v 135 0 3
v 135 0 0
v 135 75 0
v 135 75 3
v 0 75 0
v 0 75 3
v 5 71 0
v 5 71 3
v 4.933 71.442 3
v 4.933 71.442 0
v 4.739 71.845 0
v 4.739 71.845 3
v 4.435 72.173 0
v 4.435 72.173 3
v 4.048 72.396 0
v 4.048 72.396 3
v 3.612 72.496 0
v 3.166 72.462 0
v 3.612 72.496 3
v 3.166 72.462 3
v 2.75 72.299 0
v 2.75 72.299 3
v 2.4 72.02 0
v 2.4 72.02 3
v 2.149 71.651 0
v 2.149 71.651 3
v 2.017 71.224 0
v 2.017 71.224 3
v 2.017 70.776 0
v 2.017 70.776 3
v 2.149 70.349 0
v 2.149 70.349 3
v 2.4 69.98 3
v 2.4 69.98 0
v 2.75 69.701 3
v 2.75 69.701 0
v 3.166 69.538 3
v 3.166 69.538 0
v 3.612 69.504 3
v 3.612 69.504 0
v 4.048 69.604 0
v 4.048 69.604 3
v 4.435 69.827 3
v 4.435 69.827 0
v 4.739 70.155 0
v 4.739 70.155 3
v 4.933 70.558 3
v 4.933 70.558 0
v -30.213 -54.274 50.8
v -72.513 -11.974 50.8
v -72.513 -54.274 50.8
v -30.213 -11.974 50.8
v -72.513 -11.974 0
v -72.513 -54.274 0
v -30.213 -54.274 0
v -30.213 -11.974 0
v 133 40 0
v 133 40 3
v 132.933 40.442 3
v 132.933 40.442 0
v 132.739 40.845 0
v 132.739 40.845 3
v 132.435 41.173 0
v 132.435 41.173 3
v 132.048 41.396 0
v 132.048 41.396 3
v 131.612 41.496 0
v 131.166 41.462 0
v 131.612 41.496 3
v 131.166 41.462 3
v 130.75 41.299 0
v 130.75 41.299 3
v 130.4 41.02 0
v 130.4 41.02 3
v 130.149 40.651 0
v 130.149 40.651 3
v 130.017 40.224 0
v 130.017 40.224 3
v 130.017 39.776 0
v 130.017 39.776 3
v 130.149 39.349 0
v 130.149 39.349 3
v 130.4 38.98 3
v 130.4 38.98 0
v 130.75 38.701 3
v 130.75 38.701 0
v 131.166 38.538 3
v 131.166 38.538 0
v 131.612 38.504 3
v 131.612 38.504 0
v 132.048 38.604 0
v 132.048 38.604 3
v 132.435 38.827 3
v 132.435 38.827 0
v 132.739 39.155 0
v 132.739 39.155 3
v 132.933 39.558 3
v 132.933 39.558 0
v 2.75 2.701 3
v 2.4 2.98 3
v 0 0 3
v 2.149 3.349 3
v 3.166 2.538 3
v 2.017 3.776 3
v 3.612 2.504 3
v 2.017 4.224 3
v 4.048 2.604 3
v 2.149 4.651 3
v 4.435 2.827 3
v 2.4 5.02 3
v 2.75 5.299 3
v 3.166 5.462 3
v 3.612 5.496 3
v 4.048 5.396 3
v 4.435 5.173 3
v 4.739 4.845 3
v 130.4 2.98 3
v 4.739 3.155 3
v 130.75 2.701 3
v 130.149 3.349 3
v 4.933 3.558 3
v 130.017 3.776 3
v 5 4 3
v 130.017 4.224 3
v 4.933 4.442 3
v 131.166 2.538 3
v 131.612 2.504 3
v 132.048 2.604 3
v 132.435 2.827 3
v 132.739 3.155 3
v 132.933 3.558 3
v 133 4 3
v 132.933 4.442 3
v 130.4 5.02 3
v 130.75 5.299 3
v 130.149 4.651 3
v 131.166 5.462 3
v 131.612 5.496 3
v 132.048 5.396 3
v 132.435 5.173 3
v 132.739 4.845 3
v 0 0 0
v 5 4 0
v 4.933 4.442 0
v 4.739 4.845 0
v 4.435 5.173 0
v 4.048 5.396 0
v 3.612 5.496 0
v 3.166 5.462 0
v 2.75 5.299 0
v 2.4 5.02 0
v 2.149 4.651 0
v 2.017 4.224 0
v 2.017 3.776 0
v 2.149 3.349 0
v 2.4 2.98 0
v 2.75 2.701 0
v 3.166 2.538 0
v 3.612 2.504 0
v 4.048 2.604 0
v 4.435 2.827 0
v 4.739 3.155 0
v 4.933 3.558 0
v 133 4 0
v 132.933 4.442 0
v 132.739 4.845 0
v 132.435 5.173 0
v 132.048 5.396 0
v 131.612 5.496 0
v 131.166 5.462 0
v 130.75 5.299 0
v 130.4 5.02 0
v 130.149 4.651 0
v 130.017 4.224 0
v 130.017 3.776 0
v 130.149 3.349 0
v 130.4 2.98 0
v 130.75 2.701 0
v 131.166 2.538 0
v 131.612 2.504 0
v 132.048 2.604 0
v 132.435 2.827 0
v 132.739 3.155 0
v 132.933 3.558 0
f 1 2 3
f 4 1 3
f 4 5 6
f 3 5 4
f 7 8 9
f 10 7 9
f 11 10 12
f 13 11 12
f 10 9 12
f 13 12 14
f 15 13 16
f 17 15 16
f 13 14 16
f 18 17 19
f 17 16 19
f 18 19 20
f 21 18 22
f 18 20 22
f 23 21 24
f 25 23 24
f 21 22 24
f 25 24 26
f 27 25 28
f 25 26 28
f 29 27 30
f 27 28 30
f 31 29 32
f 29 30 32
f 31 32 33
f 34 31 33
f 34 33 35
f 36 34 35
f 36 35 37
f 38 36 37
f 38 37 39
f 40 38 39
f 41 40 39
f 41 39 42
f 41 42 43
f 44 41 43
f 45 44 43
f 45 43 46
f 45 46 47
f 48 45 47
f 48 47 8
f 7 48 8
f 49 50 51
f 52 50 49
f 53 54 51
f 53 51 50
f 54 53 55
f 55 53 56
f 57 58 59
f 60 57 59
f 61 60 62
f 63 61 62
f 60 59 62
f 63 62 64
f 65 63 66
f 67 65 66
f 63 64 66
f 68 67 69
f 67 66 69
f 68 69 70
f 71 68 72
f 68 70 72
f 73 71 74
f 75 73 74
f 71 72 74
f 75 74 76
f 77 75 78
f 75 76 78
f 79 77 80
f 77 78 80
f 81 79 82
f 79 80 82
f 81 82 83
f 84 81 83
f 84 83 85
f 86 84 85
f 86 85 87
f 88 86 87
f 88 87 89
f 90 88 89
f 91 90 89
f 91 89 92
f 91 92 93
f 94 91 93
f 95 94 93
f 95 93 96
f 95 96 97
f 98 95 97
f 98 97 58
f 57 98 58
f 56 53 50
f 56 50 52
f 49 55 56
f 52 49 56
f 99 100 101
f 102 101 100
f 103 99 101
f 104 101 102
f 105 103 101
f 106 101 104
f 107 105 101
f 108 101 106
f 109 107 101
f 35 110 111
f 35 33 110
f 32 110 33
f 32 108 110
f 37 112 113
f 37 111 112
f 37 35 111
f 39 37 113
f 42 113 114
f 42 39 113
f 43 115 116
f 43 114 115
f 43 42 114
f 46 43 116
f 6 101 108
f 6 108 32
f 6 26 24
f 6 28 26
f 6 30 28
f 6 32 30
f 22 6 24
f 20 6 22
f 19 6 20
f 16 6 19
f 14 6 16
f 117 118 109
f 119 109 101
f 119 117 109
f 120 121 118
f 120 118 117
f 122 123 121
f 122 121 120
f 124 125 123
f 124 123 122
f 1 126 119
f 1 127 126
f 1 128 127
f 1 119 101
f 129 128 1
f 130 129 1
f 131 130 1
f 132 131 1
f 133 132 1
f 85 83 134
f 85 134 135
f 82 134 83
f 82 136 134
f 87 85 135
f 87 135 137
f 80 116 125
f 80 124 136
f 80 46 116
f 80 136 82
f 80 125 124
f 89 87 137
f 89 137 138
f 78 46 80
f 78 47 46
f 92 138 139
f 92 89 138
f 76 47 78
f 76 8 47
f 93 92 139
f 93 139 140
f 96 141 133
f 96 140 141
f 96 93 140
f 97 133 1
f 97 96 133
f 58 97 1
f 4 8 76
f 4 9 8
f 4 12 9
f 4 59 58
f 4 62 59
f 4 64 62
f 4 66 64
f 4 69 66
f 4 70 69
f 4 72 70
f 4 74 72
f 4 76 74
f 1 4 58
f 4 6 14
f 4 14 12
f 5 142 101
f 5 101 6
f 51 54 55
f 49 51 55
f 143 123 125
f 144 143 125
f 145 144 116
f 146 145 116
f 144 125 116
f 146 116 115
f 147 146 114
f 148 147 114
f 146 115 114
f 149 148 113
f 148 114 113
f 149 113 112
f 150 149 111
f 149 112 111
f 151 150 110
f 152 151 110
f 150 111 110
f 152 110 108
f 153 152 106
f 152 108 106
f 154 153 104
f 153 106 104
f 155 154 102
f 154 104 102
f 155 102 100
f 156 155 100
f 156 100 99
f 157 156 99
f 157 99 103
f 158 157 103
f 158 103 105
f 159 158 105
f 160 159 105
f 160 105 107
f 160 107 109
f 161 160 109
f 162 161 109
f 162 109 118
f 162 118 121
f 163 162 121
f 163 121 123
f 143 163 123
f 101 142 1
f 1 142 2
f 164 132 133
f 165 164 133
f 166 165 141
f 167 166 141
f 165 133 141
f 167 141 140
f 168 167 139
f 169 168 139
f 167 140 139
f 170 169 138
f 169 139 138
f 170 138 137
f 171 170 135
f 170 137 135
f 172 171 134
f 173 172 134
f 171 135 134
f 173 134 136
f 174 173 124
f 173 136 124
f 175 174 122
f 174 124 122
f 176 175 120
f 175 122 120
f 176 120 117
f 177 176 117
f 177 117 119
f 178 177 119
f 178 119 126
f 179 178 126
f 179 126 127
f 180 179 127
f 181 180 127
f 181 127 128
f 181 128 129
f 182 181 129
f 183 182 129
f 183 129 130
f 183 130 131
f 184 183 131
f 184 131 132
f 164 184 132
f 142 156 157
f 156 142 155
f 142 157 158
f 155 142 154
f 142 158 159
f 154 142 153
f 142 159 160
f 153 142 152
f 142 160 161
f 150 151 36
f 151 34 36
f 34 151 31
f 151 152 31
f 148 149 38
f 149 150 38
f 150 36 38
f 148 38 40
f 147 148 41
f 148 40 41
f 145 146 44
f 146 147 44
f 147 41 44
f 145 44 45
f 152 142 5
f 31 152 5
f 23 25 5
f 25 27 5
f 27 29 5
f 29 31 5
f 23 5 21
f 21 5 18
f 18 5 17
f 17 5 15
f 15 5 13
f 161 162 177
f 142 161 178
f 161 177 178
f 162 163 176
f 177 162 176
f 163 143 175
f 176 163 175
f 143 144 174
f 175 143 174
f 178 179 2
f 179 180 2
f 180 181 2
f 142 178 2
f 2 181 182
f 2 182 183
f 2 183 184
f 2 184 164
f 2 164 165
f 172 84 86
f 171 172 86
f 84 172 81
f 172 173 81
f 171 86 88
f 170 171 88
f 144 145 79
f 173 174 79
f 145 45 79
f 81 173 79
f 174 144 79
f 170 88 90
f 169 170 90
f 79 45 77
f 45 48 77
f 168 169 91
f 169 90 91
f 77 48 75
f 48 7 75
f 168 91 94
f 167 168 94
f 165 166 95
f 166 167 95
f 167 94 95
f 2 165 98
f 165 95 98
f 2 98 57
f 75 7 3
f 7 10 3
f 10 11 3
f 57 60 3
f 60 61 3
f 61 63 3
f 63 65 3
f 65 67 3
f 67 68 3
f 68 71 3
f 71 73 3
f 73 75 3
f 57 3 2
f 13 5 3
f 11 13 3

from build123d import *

# Parameters (mm, degrees)
F0_W     = 135
F0_H     = 75
F1_DEPTH = 3
F2_R     = 1.5
F3_DEPTH = 25
F4_W     = 42.3
F4_H     = 42.3
F5_DEPTH = 50.8


with BuildPart() as f1:
    # F0 (on Top) → F1 (new body)
    with BuildSketch(Plane.XY):
        with Locations((67.5, 37.5)):
            Rectangle(F0_W, F0_H)
    extrude(amount=F1_DEPTH)

    # F2 (on face) → F3 (cut)
    with BuildSketch(Plane.XY.offset(3)):
        with Locations((3.5, 71)):
            Circle(F2_R)
        with Locations((3.5, 4)):
            Circle(F2_R)
        with Locations((131.5, 4)):
            Circle(F2_R)
        with Locations((131.5, 40)):
            Circle(F2_R)
    extrude(amount=-F3_DEPTH, mode=Mode.SUBTRACT)


with BuildPart() as f5:
    # F4 (on Top) → F5 (new body)
    with BuildSketch(Plane.XY):
        with Locations((-51.362559, -33.123518)):
            Rectangle(F4_W, F4_H)
    extrude(amount=F5_DEPTH)


solid = Compound([f1.part, f5.part])
